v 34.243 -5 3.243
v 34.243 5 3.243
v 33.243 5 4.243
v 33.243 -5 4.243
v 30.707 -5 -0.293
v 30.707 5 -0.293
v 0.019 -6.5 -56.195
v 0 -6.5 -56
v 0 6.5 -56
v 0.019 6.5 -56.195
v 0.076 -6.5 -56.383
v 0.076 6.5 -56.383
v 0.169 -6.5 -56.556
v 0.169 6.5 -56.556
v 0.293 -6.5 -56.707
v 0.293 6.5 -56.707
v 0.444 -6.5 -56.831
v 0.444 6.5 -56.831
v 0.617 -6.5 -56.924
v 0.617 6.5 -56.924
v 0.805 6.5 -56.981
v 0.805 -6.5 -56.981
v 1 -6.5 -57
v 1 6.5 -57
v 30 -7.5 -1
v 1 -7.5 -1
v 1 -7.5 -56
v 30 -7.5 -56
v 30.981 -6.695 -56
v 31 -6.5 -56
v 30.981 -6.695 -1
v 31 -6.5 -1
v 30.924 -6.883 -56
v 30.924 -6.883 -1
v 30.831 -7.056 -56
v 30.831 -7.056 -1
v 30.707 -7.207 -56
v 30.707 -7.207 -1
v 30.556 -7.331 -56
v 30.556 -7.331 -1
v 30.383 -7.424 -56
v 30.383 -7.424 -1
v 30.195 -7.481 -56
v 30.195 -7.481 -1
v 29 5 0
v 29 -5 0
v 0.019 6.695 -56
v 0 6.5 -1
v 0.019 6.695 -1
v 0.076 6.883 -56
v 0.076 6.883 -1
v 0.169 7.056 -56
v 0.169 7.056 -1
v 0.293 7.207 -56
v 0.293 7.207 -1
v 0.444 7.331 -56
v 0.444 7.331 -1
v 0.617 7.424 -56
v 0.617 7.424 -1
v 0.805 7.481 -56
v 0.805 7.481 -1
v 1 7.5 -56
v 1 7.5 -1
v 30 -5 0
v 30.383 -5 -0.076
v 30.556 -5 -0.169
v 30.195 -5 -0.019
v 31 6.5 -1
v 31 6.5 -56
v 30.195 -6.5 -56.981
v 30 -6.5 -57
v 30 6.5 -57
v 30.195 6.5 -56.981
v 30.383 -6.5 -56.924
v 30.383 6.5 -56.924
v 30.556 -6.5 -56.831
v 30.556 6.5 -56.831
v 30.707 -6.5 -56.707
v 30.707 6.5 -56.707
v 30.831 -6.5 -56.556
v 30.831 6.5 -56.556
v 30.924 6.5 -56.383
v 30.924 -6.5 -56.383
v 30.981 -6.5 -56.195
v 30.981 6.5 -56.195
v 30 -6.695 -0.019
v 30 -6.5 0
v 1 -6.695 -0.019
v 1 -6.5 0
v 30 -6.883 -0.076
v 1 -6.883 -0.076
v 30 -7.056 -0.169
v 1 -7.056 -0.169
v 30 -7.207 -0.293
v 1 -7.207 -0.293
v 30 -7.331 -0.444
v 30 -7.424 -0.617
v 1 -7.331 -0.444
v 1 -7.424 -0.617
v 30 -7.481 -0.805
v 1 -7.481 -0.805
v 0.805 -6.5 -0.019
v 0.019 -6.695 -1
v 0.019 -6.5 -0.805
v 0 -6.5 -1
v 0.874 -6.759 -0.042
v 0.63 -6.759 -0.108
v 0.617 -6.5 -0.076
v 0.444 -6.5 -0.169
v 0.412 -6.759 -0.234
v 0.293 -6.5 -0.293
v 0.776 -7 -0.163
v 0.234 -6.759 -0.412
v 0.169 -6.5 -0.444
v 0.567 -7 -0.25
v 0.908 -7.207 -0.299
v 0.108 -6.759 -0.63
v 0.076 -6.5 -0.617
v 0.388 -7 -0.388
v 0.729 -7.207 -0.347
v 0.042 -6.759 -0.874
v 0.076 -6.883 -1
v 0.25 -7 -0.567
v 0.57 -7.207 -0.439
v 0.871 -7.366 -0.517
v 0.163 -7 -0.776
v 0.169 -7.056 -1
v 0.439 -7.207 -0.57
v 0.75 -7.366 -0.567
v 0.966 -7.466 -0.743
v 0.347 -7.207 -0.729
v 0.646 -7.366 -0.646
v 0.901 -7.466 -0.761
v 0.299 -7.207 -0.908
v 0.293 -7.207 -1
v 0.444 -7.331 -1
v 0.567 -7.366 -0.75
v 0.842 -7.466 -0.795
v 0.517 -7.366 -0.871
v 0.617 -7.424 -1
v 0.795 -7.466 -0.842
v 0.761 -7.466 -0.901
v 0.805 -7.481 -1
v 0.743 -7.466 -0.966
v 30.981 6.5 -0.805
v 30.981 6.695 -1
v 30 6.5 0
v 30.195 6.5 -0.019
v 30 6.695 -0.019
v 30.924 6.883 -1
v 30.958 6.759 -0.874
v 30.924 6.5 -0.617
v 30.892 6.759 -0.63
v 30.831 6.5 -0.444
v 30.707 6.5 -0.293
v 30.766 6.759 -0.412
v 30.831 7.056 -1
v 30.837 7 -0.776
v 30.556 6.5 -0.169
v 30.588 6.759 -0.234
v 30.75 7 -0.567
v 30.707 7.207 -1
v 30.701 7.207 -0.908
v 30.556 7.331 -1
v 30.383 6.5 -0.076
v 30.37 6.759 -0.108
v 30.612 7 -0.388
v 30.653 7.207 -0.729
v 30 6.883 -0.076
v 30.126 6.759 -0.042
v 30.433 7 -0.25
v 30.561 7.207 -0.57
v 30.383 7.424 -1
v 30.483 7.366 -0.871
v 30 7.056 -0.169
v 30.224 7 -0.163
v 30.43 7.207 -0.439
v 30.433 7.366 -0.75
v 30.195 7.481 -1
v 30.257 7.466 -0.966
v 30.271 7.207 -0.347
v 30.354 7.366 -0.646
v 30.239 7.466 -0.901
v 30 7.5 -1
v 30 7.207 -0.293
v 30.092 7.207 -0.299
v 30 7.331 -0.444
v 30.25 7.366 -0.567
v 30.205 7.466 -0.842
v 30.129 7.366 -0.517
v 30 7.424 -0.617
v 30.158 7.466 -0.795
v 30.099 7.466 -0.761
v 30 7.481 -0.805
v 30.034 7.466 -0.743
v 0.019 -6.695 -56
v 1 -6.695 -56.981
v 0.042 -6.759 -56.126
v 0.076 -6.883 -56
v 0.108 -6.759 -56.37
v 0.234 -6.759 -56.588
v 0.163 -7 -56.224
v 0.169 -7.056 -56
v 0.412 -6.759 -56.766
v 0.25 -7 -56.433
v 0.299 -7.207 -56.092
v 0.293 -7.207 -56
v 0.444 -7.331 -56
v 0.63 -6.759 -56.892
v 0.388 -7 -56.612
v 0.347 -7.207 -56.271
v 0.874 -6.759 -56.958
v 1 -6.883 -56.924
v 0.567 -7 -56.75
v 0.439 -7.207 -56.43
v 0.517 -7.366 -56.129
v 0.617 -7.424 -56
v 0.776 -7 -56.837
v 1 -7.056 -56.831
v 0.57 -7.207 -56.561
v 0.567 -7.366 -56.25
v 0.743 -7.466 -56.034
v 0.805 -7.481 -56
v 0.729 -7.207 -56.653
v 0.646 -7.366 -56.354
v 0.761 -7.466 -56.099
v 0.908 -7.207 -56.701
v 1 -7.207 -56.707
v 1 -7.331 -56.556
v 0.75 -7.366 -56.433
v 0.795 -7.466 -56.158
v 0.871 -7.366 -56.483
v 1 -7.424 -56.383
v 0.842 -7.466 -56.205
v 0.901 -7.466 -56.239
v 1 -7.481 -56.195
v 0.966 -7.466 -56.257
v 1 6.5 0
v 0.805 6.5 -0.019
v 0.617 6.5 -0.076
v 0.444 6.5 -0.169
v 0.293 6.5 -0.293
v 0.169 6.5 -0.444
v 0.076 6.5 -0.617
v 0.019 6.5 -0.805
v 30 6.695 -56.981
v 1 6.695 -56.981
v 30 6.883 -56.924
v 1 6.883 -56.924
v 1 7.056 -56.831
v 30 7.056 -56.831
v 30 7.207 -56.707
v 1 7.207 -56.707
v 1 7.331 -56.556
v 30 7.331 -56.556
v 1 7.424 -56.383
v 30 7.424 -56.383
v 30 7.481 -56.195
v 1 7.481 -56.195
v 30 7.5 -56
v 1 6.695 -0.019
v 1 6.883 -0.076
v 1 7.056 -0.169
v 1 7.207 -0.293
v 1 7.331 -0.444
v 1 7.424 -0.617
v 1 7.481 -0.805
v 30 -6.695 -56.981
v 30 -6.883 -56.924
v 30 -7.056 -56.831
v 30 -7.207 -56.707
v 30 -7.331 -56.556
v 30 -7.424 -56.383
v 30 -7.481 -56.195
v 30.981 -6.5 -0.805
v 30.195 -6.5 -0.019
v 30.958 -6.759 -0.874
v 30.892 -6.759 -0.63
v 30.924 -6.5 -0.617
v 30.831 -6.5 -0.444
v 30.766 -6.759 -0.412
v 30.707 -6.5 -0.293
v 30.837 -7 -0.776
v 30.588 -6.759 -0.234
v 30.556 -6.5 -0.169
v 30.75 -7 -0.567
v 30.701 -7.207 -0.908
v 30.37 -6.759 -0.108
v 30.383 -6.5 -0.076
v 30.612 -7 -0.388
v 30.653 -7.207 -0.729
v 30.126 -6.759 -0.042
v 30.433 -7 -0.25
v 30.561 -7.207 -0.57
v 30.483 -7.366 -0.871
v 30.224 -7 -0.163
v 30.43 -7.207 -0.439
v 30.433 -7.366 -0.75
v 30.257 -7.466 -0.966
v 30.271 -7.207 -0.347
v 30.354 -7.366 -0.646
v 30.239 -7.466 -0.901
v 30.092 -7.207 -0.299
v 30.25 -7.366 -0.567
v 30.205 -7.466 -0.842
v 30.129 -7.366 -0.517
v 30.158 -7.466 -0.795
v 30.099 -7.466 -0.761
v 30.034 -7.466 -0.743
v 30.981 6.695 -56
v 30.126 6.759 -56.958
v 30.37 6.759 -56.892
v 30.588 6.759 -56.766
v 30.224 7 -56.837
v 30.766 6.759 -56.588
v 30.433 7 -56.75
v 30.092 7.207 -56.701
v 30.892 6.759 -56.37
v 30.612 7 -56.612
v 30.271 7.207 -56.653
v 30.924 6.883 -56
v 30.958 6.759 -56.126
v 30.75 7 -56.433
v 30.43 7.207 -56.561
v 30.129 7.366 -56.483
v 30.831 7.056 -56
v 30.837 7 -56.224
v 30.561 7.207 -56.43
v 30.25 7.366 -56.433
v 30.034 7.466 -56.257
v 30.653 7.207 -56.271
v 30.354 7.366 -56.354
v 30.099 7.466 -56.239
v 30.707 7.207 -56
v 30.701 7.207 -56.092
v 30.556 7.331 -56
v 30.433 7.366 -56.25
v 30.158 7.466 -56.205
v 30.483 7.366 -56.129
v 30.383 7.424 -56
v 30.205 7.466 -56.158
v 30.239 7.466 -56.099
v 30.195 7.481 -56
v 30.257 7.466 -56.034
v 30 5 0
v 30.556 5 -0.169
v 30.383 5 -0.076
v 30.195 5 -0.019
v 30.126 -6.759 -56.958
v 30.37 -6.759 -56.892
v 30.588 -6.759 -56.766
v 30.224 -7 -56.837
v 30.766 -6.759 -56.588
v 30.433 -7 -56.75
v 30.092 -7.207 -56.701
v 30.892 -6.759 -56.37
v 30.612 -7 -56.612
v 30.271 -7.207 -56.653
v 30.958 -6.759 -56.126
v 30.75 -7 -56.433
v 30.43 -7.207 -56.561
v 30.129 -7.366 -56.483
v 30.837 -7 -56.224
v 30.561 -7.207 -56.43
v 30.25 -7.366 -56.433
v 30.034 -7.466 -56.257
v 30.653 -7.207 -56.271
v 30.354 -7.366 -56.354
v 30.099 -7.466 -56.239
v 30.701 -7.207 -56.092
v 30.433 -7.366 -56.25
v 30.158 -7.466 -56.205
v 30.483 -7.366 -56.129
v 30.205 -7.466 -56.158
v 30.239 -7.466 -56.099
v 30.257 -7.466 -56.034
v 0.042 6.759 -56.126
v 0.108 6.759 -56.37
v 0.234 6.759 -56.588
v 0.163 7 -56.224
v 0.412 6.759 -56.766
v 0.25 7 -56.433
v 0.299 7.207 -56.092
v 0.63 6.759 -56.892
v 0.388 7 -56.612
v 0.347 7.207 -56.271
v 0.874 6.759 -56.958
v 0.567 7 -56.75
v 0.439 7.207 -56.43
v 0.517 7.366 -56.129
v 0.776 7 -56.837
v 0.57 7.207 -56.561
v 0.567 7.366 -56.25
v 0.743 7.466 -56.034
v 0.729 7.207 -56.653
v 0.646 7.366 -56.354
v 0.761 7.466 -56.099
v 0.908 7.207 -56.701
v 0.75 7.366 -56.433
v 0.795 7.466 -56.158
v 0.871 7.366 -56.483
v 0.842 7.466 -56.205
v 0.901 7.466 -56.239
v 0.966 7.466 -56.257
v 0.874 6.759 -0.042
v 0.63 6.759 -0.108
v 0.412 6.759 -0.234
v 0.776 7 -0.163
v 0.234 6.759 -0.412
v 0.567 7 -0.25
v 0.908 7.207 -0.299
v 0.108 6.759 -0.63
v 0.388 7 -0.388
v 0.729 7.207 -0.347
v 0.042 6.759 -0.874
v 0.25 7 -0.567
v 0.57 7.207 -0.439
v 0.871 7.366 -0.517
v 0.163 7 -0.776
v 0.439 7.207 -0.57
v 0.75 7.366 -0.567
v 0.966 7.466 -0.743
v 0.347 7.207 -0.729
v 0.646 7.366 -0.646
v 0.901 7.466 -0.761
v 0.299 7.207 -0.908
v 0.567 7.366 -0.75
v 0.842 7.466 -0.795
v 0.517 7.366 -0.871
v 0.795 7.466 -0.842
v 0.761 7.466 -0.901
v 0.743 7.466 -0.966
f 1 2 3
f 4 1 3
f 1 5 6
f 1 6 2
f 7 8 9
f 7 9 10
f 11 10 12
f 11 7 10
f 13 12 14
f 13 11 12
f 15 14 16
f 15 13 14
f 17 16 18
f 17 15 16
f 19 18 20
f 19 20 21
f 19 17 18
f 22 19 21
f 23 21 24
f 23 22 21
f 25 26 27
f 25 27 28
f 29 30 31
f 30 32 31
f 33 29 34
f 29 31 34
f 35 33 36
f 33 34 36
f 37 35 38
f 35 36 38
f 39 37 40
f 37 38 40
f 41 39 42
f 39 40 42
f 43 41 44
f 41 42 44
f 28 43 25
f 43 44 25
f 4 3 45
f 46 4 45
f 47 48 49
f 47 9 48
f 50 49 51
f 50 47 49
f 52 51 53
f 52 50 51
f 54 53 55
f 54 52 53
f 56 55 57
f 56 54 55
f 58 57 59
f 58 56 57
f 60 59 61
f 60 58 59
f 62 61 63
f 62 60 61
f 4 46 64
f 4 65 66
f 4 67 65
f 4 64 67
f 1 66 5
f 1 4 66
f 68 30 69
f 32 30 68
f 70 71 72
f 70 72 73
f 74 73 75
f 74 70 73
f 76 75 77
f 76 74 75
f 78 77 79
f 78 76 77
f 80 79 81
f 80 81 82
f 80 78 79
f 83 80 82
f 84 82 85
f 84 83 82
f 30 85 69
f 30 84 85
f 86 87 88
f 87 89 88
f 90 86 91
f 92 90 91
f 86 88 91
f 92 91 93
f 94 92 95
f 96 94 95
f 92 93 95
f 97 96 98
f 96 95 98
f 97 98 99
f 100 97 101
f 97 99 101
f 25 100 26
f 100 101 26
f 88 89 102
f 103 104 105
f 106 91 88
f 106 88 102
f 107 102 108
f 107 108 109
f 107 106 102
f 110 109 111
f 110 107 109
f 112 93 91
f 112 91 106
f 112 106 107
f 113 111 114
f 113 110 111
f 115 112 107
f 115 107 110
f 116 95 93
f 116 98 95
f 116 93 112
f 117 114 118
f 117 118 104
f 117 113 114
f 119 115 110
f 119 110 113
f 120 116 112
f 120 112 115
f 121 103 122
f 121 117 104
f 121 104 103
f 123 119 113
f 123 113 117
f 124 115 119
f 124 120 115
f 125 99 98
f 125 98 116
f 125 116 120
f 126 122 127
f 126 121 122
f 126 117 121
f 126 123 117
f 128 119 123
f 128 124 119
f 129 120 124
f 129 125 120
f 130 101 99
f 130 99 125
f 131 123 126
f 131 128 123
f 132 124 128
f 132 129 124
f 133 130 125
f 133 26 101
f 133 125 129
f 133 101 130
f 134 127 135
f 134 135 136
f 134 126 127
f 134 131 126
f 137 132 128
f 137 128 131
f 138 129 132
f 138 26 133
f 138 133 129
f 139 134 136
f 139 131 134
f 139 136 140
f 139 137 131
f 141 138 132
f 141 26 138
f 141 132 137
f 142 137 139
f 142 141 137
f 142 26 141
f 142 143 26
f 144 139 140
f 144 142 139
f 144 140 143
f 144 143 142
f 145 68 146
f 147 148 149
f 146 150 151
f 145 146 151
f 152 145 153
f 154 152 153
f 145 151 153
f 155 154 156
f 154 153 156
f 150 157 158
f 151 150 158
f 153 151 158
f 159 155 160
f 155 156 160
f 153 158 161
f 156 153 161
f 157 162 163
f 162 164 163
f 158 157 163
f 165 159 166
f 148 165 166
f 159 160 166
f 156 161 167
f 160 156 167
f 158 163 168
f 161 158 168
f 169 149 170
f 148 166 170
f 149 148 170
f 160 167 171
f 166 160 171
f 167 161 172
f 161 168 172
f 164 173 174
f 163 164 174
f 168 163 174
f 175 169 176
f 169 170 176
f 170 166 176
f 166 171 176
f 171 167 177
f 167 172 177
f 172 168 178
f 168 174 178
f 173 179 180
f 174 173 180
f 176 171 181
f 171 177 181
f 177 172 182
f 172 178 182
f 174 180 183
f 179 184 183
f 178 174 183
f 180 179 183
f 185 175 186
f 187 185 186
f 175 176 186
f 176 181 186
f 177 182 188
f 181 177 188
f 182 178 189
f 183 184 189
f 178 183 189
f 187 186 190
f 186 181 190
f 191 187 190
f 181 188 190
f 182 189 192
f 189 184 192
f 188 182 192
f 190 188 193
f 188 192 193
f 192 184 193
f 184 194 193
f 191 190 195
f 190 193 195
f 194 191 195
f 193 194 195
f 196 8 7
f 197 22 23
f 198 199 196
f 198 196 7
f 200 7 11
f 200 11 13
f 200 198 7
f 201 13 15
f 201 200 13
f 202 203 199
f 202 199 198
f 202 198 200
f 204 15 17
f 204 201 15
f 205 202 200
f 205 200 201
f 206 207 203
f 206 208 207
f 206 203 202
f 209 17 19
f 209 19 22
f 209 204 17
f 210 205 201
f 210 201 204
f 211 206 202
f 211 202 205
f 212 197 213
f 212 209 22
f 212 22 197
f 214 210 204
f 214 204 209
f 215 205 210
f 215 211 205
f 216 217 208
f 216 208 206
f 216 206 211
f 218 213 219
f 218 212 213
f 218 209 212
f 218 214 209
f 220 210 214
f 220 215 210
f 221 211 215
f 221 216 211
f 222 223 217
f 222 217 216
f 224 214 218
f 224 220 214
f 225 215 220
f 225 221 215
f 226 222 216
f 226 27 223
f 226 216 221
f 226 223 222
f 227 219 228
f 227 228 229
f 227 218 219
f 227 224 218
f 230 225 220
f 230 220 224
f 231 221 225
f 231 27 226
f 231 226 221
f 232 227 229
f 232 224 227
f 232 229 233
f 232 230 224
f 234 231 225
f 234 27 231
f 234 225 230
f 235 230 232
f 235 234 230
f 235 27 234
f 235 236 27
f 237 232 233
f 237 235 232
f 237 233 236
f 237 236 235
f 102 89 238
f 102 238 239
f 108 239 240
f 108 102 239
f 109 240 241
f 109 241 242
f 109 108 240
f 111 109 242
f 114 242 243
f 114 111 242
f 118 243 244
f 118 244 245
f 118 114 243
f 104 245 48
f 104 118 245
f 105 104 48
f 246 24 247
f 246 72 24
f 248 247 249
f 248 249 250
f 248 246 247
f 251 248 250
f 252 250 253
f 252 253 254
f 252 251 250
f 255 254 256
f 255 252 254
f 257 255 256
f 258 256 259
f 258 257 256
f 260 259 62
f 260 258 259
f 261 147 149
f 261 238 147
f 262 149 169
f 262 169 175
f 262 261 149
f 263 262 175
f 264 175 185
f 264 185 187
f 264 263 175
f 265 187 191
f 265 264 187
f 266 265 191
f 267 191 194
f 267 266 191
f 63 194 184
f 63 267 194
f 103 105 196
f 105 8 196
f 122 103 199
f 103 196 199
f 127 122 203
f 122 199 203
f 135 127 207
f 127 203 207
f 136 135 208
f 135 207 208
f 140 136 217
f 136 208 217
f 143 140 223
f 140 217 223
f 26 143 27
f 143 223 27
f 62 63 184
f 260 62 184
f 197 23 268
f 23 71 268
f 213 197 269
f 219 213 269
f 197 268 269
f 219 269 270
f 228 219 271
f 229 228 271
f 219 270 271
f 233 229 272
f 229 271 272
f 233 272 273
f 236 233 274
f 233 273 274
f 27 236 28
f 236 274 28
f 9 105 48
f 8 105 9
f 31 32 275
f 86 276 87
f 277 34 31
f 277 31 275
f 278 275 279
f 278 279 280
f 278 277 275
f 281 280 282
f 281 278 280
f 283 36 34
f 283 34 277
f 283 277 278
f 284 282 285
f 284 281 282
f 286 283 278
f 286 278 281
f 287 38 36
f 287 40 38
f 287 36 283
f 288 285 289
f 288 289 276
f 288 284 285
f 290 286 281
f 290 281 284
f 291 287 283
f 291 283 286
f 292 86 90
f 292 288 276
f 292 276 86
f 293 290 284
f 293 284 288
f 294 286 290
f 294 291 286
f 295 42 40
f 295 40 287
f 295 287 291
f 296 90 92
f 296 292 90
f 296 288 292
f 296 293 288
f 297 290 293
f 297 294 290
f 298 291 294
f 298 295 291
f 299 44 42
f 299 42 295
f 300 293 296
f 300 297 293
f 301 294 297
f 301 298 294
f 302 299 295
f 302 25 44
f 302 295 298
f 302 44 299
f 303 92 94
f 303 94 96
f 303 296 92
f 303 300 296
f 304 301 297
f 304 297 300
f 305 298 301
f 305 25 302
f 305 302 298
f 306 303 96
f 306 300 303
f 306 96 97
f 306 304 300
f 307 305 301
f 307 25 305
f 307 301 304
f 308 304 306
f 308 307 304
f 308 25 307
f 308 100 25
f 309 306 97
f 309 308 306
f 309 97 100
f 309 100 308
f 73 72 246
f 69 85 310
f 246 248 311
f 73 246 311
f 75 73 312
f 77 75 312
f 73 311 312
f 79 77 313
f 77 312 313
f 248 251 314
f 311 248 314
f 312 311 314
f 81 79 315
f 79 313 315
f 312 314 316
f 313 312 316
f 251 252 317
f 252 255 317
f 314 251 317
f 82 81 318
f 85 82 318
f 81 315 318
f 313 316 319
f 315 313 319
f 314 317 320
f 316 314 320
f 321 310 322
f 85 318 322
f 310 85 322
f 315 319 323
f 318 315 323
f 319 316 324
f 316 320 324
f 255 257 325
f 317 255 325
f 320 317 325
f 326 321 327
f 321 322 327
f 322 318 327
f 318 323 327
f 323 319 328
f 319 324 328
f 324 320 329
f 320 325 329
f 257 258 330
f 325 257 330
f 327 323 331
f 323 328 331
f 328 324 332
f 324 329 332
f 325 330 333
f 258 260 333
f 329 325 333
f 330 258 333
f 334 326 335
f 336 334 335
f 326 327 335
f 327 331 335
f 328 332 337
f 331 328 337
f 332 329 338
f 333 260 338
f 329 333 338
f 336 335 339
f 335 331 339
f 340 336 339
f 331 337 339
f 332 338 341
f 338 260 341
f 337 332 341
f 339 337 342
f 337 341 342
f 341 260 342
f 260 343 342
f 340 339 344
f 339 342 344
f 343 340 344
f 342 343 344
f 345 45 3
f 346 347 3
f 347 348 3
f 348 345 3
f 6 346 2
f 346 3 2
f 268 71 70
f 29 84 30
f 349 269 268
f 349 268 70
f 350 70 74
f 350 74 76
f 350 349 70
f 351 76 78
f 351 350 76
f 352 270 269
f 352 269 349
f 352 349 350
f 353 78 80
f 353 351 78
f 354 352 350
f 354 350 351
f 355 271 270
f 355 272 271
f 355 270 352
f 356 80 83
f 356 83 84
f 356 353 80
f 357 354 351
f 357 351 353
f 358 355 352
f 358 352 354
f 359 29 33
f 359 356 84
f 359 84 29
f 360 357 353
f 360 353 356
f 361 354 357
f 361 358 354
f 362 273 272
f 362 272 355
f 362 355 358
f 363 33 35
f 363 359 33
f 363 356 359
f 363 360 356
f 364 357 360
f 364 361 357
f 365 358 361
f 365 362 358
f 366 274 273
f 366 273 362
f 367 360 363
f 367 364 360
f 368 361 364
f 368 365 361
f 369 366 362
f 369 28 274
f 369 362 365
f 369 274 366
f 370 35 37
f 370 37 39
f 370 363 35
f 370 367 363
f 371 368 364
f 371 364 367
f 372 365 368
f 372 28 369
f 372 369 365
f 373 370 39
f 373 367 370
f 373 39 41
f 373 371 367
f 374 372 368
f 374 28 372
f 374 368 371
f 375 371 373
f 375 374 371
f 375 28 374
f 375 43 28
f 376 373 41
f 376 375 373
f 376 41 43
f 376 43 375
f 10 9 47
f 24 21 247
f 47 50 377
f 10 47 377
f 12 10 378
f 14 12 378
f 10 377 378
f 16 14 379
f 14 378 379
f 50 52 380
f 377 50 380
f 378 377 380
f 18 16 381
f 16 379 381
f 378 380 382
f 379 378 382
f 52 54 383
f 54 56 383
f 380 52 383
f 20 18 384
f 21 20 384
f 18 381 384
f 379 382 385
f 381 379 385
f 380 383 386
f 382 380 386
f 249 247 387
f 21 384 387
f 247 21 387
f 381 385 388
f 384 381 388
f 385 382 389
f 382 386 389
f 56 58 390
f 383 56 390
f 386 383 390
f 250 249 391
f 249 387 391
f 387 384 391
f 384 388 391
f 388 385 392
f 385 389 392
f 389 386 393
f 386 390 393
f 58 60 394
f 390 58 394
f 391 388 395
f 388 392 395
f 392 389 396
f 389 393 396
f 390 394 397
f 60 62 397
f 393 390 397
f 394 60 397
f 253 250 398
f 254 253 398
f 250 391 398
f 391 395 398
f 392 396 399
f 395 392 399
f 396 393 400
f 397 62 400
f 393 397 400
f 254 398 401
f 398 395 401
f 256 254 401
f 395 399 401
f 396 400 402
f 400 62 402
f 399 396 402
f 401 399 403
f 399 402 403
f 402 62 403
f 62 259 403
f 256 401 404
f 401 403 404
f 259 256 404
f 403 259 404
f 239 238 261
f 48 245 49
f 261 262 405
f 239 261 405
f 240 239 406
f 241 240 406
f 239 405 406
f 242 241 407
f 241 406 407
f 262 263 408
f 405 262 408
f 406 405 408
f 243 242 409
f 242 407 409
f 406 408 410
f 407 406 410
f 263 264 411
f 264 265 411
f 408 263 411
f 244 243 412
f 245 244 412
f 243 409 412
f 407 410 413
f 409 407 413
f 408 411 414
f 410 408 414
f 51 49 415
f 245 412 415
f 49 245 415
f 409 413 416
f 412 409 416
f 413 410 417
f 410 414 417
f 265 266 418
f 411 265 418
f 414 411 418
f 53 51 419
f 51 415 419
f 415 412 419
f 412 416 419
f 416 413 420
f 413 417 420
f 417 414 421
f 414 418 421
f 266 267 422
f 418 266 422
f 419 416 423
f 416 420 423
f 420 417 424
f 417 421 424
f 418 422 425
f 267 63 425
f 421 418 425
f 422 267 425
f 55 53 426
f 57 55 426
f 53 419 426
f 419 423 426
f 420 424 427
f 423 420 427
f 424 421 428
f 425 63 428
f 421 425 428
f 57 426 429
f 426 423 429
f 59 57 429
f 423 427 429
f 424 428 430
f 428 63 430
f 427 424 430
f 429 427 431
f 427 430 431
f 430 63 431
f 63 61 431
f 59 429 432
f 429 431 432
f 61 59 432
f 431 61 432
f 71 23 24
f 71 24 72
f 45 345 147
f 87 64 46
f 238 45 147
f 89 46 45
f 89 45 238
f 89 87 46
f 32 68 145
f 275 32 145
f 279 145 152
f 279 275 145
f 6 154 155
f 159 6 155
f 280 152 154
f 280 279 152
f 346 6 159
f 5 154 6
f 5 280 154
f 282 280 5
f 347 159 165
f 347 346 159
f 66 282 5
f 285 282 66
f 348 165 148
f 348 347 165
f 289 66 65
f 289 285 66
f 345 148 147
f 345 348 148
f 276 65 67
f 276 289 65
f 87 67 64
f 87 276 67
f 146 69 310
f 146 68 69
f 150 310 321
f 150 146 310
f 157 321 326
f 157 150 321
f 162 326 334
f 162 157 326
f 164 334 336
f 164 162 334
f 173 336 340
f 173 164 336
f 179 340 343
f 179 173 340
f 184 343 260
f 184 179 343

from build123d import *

# Parameters (mm, degrees)
F1_DEPTH = 7.5
F2_R     = 1
F4_DEPTH = 5


with BuildPart() as f1:
    # F0 (on Front) → F1 (new body, symmetric)
    with BuildSketch(Plane.XZ):
        with BuildLine():
            Line((30, 0), (1, 0))
            ThreePointArc((1, 0), (0.2928932188, -0.2928932188), (0, -1))
            Line((0, -1), (0, -56))
            ThreePointArc((0, -56), (0.2928932188, -56.7071067812), (1, -57))
            Line((1, -57), (30, -57))
            ThreePointArc((30, -57), (30.7071067812, -56.7071067812), (31, -56))
            Line((31, -56), (31, -1))
            ThreePointArc((31, -1), (30.7071067812, -0.2928932188), (30, 0))
        make_face()
    extrude(amount=F1_DEPTH, both=True)

    # F2
    f2_edges = [f1.edges().sort_by_distance(p)[0] for p in [
        (15.5, -7.5, 0),
        (0.292893, -7.5, -0.292893),
        (0, -7.5, -28.5),
        (0.292893, -7.5, -56.707107),
        (15.5, -7.5, -57),
        (30.707107, -7.5, -56.707107),
        (31, -7.5, -28.5),
        (30.707107, -7.5, -0.292893),
        (15.5, 7.5, 0),
        (0.292893, 7.5, -0.292893),
        (0, 7.5, -28.5),
        (0.292893, 7.5, -56.707107),
        (15.5, 7.5, -57),
        (30.707107, 7.5, -56.707107),
        (31, 7.5, -28.5),
        (30.707107, 7.5, -0.292893),
    ]]
    fillet(f2_edges, radius=F2_R)

    # F3 (on Front) → F4 (join, symmetric)
    with BuildSketch(Plane.XZ):
        Polygon((29, 0), (30, -1), (34.2426406871, 3.2426406871), (33.2426406871, 4.2426406871), align=None)
    extrude(amount=F4_DEPTH, both=True)


solid = f1.part
